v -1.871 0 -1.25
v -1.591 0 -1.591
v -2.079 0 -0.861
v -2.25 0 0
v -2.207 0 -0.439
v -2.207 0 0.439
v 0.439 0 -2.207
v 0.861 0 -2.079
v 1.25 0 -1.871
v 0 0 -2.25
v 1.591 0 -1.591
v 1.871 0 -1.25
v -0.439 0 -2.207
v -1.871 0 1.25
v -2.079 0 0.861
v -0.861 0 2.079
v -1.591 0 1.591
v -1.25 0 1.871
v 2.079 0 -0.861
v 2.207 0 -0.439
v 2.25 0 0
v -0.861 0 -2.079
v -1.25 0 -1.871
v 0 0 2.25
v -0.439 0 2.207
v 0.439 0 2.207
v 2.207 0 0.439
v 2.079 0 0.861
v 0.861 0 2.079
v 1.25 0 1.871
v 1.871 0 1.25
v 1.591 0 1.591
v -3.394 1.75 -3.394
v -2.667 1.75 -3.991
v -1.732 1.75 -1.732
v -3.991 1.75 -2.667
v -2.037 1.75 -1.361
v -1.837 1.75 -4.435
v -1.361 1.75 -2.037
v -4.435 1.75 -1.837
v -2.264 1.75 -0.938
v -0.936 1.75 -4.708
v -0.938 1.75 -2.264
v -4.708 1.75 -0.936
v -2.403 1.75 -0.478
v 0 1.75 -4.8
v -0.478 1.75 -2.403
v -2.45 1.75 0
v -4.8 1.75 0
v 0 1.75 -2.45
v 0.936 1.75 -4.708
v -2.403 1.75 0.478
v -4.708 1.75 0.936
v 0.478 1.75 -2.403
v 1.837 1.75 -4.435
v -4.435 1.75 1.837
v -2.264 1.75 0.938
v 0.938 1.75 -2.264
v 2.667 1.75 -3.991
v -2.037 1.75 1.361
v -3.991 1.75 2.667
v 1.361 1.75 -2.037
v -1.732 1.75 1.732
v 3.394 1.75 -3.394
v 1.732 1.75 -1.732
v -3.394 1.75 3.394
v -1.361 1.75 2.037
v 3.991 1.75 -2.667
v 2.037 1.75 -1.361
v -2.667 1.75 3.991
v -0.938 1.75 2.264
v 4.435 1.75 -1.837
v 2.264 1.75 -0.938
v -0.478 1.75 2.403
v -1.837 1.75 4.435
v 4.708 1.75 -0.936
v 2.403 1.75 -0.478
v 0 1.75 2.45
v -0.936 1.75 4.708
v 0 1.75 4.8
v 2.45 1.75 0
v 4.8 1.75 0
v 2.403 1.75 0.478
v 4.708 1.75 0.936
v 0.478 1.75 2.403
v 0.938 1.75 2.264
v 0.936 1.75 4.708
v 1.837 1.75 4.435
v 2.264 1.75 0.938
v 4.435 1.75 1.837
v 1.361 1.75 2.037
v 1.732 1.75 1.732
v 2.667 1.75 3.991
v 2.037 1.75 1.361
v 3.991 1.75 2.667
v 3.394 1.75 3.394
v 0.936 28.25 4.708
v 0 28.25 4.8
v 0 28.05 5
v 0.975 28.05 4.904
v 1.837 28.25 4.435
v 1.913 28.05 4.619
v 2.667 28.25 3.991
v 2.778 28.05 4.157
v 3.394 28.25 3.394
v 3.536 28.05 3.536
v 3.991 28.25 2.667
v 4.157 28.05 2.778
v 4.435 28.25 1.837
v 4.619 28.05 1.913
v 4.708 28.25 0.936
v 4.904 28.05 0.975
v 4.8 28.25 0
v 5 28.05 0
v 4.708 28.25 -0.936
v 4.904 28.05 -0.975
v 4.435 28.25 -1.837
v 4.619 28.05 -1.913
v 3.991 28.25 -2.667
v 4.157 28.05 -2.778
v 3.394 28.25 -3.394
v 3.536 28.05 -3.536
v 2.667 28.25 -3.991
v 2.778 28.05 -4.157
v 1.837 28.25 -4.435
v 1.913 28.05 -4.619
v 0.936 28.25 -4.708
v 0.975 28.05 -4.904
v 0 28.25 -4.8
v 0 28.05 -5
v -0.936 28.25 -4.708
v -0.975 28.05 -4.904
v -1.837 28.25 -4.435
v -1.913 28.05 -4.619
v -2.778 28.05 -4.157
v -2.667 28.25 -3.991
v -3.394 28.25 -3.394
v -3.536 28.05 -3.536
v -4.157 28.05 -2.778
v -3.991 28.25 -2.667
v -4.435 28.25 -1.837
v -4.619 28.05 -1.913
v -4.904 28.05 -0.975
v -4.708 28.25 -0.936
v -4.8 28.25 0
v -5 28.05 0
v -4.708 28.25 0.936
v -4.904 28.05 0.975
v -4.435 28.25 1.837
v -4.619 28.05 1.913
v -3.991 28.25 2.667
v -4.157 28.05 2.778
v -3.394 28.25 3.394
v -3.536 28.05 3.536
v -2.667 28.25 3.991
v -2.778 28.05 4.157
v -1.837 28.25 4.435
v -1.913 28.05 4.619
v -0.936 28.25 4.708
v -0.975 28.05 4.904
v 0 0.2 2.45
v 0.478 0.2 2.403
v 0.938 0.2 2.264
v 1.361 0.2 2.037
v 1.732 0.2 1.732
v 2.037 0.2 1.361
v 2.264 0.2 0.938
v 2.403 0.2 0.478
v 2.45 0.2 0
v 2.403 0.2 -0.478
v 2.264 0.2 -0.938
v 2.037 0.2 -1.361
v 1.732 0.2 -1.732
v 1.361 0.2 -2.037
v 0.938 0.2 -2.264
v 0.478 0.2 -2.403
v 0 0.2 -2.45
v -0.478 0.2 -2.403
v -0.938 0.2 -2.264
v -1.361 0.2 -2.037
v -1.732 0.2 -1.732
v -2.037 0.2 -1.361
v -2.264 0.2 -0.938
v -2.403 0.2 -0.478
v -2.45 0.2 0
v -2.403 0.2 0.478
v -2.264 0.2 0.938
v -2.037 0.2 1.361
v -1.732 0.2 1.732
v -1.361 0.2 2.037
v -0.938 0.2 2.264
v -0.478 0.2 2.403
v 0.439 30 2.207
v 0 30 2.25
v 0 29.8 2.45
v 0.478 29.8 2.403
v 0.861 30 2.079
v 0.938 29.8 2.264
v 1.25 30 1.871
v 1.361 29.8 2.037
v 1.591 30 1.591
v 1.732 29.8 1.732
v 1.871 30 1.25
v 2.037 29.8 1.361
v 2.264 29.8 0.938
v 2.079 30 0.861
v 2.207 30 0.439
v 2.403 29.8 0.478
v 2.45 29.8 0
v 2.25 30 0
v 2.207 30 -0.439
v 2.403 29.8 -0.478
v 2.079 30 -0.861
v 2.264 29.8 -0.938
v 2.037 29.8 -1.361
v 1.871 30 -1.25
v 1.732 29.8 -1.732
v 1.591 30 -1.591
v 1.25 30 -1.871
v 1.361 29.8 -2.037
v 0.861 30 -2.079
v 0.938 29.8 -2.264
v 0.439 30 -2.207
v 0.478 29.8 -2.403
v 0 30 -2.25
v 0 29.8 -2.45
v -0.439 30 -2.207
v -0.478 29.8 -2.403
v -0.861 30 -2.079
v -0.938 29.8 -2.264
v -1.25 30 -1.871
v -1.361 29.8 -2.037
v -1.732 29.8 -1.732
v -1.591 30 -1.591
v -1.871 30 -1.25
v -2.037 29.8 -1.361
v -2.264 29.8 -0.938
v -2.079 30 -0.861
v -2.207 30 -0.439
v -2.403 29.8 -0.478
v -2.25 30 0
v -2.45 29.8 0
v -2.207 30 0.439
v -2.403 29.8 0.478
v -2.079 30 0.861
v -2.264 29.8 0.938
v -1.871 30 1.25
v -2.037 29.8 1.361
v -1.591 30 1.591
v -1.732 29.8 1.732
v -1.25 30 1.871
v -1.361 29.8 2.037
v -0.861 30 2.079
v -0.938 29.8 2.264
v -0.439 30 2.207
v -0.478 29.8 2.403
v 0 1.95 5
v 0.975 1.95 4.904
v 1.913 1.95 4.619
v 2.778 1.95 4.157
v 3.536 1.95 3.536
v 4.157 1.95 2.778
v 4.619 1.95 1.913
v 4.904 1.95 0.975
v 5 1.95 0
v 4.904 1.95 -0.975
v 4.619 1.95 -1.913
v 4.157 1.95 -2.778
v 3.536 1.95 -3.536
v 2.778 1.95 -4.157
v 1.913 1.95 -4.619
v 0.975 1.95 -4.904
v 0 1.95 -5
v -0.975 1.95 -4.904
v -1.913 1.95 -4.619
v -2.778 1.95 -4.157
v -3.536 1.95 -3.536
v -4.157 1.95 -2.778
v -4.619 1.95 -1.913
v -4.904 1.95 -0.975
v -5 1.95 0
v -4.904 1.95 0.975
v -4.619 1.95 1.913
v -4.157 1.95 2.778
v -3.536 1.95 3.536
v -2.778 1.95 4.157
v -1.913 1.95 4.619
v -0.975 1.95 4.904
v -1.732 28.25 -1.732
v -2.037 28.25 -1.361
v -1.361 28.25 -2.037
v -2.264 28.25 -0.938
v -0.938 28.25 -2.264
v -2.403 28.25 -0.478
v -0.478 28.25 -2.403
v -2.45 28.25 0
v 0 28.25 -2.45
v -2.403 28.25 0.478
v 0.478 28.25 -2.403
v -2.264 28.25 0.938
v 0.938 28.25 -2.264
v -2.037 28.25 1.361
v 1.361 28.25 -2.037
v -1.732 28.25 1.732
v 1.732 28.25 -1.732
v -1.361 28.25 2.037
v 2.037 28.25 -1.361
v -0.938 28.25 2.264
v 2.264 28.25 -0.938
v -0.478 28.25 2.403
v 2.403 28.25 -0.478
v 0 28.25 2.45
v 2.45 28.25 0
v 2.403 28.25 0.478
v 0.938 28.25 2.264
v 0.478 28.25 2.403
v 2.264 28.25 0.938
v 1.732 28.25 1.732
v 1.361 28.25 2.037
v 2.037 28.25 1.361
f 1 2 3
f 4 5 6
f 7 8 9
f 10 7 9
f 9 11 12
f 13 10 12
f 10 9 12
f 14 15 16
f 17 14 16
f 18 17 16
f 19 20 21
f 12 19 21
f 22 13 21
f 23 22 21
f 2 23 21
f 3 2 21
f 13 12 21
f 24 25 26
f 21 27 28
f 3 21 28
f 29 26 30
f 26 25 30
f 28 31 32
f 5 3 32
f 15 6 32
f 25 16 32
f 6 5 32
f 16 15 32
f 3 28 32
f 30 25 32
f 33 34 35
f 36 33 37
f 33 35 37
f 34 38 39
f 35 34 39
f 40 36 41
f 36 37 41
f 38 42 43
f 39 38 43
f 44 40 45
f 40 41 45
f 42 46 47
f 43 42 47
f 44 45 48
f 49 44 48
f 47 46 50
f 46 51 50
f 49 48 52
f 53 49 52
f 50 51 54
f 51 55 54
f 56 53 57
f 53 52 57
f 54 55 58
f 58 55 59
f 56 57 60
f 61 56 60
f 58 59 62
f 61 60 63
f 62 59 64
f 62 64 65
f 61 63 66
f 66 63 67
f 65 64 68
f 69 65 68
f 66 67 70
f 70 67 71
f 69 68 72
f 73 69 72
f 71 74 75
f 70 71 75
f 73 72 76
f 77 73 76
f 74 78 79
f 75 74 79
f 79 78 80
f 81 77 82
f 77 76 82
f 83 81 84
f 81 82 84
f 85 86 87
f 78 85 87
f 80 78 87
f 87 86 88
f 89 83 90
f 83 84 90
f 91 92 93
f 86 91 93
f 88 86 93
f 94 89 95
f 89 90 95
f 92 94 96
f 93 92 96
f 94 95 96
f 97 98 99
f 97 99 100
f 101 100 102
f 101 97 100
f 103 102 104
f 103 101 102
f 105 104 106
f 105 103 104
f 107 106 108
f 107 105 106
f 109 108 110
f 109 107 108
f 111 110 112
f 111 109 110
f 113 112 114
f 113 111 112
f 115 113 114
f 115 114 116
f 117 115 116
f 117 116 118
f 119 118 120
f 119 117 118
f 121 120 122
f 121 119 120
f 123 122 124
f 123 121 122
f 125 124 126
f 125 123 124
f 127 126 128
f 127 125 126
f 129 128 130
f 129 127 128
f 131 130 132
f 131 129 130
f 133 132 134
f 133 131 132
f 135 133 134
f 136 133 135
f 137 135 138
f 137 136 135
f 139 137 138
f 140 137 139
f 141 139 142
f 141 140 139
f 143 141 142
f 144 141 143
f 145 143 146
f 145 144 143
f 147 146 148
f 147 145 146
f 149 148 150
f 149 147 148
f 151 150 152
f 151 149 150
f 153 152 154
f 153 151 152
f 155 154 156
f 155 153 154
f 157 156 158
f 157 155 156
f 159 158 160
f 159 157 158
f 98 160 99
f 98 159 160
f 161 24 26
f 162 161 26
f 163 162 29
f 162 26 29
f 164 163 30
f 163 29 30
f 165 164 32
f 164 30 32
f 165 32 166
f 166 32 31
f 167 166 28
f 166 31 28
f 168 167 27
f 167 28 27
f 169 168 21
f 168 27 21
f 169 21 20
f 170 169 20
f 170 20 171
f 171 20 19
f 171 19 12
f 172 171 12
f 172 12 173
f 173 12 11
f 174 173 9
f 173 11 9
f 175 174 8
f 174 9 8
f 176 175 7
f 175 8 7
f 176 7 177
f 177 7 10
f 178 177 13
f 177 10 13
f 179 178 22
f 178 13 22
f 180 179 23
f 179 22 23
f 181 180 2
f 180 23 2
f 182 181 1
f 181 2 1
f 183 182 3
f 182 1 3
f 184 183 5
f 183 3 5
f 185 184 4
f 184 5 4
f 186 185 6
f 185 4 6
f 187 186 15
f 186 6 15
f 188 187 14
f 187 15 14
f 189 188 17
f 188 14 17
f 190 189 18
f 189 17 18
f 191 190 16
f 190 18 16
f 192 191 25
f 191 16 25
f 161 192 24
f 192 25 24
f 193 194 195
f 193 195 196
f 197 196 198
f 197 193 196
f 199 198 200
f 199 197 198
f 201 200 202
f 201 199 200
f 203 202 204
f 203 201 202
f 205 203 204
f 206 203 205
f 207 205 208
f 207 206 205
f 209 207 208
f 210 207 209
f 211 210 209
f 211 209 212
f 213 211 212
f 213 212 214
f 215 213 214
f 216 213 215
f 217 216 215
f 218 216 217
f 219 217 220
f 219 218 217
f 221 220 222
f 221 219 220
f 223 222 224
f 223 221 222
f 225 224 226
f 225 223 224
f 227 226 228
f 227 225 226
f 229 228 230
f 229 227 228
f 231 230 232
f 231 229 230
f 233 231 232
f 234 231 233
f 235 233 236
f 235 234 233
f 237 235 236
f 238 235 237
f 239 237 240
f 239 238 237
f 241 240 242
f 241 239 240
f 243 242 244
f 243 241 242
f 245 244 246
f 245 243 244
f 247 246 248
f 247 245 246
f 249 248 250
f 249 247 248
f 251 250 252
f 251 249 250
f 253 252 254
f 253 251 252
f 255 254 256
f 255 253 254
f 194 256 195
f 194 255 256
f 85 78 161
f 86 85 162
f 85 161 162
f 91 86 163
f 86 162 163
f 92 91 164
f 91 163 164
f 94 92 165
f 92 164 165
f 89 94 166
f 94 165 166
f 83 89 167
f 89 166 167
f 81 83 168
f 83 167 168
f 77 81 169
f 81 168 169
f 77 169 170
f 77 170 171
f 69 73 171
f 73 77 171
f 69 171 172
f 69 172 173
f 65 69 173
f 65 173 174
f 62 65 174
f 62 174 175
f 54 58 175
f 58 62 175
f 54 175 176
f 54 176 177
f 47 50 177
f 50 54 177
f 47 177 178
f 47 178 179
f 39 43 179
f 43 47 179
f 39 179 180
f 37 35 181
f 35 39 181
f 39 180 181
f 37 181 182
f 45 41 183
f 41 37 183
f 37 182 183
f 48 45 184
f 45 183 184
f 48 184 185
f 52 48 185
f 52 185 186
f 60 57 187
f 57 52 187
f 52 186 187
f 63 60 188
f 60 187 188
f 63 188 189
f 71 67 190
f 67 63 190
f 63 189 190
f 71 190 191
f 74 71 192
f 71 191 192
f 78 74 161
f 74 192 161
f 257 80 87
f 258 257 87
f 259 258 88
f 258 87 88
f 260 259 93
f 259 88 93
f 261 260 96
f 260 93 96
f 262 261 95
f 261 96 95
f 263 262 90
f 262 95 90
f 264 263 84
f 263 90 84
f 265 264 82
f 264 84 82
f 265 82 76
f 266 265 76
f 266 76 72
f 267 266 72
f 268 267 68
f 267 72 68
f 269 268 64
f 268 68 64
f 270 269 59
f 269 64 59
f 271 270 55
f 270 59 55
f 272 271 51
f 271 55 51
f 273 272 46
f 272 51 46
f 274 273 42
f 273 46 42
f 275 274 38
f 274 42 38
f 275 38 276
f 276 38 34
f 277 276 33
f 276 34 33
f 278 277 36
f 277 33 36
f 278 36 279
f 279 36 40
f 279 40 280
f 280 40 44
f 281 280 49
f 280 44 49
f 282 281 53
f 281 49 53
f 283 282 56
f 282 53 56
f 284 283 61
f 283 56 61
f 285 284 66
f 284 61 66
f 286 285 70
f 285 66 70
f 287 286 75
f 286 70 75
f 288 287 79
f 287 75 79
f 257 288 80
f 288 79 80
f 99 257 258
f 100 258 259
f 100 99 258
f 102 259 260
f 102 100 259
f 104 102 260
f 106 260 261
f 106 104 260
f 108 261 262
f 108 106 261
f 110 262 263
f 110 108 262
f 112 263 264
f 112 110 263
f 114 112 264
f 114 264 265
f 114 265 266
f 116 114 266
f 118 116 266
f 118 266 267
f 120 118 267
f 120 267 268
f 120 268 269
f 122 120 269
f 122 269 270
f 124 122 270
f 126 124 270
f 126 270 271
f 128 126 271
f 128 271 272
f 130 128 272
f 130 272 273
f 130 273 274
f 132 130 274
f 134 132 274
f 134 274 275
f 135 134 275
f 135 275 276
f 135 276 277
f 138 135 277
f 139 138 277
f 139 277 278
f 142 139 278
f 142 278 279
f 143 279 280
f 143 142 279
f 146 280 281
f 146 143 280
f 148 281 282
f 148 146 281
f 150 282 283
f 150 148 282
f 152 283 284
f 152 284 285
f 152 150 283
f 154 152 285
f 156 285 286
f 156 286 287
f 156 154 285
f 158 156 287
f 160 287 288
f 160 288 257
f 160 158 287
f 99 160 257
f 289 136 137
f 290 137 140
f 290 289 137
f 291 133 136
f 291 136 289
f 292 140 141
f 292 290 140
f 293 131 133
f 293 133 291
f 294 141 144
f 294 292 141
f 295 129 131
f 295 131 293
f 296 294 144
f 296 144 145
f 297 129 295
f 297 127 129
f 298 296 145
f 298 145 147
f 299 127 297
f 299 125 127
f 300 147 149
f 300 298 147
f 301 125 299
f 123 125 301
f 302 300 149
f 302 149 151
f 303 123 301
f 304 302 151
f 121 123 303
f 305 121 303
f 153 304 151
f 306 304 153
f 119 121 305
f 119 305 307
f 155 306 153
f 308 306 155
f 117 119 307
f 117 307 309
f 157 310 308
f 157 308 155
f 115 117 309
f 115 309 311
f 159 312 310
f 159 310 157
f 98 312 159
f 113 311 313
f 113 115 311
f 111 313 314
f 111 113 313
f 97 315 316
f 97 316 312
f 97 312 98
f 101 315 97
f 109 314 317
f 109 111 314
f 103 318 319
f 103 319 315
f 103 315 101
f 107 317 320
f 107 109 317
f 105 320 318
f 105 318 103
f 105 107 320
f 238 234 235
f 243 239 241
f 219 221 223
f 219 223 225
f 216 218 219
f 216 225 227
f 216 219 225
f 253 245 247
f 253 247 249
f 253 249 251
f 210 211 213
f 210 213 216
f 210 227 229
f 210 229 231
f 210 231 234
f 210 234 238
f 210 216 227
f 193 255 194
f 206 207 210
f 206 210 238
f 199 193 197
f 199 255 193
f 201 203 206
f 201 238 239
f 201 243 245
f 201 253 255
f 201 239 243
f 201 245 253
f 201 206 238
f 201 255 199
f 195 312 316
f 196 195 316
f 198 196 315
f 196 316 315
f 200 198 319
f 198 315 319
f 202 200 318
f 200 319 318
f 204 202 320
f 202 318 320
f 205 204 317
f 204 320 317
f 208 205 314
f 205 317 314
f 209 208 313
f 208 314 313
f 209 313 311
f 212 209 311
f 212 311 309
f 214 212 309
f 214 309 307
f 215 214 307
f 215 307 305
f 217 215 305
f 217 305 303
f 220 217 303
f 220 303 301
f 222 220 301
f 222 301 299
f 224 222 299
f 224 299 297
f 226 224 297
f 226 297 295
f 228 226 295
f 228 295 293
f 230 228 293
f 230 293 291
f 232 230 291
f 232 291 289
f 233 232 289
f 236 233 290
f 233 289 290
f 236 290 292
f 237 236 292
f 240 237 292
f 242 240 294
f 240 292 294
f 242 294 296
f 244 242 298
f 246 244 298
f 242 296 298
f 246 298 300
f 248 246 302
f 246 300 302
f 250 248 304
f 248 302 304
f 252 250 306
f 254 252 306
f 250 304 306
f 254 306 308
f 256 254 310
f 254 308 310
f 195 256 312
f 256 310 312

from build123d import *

# Parameters (mm, degrees)
SKETCH1_R           = 2.45
BOSS_EXTRUDE1_DEPTH = 30
CHAMFER1_SIZE       = 0.2
SKETCH2_R           = 5
BOSS_EXTRUDE2_DEPTH = 13.25
CHAMFER2_SIZE       = 0.2


with BuildPart() as part:
    # Sketch1 → Boss-Extrude1 (new body)
    with BuildSketch(Plane(origin=(0, 0, 0), x_dir=(1, 0, 0), z_dir=(0, 1, 0))):
        with Locations(Location((0, 0, 0), (0, 0, 270))):
            Circle(SKETCH1_R)
    extrude(amount=BOSS_EXTRUDE1_DEPTH)

    # Chamfer1
    chamfer1_edges = [part.edges().sort_by_distance(p)[0] for p in [
        (0, 0, -2.45),
        (0, 30, -2.45),
    ]]
    chamfer(chamfer1_edges, length=CHAMFER1_SIZE)

    # Sketch2 → Boss-Extrude2 (add, symmetric)
    with BuildSketch(Plane(origin=(0, 15, 0), x_dir=(1, 0, 0), z_dir=(0, 1, 0))):
        with Locations(Location((0, 0, 0), (0, 0, 270))):
            Circle(SKETCH2_R)
    extrude(amount=BOSS_EXTRUDE2_DEPTH, both=True)

    # Chamfer2
    chamfer2_edges = [part.edges().sort_by_distance(p)[0] for p in [
        (0, 1.75, -5),
        (0, 28.25, -5),
    ]]
    chamfer(chamfer2_edges, length=CHAMFER2_SIZE)


solid = part.part
